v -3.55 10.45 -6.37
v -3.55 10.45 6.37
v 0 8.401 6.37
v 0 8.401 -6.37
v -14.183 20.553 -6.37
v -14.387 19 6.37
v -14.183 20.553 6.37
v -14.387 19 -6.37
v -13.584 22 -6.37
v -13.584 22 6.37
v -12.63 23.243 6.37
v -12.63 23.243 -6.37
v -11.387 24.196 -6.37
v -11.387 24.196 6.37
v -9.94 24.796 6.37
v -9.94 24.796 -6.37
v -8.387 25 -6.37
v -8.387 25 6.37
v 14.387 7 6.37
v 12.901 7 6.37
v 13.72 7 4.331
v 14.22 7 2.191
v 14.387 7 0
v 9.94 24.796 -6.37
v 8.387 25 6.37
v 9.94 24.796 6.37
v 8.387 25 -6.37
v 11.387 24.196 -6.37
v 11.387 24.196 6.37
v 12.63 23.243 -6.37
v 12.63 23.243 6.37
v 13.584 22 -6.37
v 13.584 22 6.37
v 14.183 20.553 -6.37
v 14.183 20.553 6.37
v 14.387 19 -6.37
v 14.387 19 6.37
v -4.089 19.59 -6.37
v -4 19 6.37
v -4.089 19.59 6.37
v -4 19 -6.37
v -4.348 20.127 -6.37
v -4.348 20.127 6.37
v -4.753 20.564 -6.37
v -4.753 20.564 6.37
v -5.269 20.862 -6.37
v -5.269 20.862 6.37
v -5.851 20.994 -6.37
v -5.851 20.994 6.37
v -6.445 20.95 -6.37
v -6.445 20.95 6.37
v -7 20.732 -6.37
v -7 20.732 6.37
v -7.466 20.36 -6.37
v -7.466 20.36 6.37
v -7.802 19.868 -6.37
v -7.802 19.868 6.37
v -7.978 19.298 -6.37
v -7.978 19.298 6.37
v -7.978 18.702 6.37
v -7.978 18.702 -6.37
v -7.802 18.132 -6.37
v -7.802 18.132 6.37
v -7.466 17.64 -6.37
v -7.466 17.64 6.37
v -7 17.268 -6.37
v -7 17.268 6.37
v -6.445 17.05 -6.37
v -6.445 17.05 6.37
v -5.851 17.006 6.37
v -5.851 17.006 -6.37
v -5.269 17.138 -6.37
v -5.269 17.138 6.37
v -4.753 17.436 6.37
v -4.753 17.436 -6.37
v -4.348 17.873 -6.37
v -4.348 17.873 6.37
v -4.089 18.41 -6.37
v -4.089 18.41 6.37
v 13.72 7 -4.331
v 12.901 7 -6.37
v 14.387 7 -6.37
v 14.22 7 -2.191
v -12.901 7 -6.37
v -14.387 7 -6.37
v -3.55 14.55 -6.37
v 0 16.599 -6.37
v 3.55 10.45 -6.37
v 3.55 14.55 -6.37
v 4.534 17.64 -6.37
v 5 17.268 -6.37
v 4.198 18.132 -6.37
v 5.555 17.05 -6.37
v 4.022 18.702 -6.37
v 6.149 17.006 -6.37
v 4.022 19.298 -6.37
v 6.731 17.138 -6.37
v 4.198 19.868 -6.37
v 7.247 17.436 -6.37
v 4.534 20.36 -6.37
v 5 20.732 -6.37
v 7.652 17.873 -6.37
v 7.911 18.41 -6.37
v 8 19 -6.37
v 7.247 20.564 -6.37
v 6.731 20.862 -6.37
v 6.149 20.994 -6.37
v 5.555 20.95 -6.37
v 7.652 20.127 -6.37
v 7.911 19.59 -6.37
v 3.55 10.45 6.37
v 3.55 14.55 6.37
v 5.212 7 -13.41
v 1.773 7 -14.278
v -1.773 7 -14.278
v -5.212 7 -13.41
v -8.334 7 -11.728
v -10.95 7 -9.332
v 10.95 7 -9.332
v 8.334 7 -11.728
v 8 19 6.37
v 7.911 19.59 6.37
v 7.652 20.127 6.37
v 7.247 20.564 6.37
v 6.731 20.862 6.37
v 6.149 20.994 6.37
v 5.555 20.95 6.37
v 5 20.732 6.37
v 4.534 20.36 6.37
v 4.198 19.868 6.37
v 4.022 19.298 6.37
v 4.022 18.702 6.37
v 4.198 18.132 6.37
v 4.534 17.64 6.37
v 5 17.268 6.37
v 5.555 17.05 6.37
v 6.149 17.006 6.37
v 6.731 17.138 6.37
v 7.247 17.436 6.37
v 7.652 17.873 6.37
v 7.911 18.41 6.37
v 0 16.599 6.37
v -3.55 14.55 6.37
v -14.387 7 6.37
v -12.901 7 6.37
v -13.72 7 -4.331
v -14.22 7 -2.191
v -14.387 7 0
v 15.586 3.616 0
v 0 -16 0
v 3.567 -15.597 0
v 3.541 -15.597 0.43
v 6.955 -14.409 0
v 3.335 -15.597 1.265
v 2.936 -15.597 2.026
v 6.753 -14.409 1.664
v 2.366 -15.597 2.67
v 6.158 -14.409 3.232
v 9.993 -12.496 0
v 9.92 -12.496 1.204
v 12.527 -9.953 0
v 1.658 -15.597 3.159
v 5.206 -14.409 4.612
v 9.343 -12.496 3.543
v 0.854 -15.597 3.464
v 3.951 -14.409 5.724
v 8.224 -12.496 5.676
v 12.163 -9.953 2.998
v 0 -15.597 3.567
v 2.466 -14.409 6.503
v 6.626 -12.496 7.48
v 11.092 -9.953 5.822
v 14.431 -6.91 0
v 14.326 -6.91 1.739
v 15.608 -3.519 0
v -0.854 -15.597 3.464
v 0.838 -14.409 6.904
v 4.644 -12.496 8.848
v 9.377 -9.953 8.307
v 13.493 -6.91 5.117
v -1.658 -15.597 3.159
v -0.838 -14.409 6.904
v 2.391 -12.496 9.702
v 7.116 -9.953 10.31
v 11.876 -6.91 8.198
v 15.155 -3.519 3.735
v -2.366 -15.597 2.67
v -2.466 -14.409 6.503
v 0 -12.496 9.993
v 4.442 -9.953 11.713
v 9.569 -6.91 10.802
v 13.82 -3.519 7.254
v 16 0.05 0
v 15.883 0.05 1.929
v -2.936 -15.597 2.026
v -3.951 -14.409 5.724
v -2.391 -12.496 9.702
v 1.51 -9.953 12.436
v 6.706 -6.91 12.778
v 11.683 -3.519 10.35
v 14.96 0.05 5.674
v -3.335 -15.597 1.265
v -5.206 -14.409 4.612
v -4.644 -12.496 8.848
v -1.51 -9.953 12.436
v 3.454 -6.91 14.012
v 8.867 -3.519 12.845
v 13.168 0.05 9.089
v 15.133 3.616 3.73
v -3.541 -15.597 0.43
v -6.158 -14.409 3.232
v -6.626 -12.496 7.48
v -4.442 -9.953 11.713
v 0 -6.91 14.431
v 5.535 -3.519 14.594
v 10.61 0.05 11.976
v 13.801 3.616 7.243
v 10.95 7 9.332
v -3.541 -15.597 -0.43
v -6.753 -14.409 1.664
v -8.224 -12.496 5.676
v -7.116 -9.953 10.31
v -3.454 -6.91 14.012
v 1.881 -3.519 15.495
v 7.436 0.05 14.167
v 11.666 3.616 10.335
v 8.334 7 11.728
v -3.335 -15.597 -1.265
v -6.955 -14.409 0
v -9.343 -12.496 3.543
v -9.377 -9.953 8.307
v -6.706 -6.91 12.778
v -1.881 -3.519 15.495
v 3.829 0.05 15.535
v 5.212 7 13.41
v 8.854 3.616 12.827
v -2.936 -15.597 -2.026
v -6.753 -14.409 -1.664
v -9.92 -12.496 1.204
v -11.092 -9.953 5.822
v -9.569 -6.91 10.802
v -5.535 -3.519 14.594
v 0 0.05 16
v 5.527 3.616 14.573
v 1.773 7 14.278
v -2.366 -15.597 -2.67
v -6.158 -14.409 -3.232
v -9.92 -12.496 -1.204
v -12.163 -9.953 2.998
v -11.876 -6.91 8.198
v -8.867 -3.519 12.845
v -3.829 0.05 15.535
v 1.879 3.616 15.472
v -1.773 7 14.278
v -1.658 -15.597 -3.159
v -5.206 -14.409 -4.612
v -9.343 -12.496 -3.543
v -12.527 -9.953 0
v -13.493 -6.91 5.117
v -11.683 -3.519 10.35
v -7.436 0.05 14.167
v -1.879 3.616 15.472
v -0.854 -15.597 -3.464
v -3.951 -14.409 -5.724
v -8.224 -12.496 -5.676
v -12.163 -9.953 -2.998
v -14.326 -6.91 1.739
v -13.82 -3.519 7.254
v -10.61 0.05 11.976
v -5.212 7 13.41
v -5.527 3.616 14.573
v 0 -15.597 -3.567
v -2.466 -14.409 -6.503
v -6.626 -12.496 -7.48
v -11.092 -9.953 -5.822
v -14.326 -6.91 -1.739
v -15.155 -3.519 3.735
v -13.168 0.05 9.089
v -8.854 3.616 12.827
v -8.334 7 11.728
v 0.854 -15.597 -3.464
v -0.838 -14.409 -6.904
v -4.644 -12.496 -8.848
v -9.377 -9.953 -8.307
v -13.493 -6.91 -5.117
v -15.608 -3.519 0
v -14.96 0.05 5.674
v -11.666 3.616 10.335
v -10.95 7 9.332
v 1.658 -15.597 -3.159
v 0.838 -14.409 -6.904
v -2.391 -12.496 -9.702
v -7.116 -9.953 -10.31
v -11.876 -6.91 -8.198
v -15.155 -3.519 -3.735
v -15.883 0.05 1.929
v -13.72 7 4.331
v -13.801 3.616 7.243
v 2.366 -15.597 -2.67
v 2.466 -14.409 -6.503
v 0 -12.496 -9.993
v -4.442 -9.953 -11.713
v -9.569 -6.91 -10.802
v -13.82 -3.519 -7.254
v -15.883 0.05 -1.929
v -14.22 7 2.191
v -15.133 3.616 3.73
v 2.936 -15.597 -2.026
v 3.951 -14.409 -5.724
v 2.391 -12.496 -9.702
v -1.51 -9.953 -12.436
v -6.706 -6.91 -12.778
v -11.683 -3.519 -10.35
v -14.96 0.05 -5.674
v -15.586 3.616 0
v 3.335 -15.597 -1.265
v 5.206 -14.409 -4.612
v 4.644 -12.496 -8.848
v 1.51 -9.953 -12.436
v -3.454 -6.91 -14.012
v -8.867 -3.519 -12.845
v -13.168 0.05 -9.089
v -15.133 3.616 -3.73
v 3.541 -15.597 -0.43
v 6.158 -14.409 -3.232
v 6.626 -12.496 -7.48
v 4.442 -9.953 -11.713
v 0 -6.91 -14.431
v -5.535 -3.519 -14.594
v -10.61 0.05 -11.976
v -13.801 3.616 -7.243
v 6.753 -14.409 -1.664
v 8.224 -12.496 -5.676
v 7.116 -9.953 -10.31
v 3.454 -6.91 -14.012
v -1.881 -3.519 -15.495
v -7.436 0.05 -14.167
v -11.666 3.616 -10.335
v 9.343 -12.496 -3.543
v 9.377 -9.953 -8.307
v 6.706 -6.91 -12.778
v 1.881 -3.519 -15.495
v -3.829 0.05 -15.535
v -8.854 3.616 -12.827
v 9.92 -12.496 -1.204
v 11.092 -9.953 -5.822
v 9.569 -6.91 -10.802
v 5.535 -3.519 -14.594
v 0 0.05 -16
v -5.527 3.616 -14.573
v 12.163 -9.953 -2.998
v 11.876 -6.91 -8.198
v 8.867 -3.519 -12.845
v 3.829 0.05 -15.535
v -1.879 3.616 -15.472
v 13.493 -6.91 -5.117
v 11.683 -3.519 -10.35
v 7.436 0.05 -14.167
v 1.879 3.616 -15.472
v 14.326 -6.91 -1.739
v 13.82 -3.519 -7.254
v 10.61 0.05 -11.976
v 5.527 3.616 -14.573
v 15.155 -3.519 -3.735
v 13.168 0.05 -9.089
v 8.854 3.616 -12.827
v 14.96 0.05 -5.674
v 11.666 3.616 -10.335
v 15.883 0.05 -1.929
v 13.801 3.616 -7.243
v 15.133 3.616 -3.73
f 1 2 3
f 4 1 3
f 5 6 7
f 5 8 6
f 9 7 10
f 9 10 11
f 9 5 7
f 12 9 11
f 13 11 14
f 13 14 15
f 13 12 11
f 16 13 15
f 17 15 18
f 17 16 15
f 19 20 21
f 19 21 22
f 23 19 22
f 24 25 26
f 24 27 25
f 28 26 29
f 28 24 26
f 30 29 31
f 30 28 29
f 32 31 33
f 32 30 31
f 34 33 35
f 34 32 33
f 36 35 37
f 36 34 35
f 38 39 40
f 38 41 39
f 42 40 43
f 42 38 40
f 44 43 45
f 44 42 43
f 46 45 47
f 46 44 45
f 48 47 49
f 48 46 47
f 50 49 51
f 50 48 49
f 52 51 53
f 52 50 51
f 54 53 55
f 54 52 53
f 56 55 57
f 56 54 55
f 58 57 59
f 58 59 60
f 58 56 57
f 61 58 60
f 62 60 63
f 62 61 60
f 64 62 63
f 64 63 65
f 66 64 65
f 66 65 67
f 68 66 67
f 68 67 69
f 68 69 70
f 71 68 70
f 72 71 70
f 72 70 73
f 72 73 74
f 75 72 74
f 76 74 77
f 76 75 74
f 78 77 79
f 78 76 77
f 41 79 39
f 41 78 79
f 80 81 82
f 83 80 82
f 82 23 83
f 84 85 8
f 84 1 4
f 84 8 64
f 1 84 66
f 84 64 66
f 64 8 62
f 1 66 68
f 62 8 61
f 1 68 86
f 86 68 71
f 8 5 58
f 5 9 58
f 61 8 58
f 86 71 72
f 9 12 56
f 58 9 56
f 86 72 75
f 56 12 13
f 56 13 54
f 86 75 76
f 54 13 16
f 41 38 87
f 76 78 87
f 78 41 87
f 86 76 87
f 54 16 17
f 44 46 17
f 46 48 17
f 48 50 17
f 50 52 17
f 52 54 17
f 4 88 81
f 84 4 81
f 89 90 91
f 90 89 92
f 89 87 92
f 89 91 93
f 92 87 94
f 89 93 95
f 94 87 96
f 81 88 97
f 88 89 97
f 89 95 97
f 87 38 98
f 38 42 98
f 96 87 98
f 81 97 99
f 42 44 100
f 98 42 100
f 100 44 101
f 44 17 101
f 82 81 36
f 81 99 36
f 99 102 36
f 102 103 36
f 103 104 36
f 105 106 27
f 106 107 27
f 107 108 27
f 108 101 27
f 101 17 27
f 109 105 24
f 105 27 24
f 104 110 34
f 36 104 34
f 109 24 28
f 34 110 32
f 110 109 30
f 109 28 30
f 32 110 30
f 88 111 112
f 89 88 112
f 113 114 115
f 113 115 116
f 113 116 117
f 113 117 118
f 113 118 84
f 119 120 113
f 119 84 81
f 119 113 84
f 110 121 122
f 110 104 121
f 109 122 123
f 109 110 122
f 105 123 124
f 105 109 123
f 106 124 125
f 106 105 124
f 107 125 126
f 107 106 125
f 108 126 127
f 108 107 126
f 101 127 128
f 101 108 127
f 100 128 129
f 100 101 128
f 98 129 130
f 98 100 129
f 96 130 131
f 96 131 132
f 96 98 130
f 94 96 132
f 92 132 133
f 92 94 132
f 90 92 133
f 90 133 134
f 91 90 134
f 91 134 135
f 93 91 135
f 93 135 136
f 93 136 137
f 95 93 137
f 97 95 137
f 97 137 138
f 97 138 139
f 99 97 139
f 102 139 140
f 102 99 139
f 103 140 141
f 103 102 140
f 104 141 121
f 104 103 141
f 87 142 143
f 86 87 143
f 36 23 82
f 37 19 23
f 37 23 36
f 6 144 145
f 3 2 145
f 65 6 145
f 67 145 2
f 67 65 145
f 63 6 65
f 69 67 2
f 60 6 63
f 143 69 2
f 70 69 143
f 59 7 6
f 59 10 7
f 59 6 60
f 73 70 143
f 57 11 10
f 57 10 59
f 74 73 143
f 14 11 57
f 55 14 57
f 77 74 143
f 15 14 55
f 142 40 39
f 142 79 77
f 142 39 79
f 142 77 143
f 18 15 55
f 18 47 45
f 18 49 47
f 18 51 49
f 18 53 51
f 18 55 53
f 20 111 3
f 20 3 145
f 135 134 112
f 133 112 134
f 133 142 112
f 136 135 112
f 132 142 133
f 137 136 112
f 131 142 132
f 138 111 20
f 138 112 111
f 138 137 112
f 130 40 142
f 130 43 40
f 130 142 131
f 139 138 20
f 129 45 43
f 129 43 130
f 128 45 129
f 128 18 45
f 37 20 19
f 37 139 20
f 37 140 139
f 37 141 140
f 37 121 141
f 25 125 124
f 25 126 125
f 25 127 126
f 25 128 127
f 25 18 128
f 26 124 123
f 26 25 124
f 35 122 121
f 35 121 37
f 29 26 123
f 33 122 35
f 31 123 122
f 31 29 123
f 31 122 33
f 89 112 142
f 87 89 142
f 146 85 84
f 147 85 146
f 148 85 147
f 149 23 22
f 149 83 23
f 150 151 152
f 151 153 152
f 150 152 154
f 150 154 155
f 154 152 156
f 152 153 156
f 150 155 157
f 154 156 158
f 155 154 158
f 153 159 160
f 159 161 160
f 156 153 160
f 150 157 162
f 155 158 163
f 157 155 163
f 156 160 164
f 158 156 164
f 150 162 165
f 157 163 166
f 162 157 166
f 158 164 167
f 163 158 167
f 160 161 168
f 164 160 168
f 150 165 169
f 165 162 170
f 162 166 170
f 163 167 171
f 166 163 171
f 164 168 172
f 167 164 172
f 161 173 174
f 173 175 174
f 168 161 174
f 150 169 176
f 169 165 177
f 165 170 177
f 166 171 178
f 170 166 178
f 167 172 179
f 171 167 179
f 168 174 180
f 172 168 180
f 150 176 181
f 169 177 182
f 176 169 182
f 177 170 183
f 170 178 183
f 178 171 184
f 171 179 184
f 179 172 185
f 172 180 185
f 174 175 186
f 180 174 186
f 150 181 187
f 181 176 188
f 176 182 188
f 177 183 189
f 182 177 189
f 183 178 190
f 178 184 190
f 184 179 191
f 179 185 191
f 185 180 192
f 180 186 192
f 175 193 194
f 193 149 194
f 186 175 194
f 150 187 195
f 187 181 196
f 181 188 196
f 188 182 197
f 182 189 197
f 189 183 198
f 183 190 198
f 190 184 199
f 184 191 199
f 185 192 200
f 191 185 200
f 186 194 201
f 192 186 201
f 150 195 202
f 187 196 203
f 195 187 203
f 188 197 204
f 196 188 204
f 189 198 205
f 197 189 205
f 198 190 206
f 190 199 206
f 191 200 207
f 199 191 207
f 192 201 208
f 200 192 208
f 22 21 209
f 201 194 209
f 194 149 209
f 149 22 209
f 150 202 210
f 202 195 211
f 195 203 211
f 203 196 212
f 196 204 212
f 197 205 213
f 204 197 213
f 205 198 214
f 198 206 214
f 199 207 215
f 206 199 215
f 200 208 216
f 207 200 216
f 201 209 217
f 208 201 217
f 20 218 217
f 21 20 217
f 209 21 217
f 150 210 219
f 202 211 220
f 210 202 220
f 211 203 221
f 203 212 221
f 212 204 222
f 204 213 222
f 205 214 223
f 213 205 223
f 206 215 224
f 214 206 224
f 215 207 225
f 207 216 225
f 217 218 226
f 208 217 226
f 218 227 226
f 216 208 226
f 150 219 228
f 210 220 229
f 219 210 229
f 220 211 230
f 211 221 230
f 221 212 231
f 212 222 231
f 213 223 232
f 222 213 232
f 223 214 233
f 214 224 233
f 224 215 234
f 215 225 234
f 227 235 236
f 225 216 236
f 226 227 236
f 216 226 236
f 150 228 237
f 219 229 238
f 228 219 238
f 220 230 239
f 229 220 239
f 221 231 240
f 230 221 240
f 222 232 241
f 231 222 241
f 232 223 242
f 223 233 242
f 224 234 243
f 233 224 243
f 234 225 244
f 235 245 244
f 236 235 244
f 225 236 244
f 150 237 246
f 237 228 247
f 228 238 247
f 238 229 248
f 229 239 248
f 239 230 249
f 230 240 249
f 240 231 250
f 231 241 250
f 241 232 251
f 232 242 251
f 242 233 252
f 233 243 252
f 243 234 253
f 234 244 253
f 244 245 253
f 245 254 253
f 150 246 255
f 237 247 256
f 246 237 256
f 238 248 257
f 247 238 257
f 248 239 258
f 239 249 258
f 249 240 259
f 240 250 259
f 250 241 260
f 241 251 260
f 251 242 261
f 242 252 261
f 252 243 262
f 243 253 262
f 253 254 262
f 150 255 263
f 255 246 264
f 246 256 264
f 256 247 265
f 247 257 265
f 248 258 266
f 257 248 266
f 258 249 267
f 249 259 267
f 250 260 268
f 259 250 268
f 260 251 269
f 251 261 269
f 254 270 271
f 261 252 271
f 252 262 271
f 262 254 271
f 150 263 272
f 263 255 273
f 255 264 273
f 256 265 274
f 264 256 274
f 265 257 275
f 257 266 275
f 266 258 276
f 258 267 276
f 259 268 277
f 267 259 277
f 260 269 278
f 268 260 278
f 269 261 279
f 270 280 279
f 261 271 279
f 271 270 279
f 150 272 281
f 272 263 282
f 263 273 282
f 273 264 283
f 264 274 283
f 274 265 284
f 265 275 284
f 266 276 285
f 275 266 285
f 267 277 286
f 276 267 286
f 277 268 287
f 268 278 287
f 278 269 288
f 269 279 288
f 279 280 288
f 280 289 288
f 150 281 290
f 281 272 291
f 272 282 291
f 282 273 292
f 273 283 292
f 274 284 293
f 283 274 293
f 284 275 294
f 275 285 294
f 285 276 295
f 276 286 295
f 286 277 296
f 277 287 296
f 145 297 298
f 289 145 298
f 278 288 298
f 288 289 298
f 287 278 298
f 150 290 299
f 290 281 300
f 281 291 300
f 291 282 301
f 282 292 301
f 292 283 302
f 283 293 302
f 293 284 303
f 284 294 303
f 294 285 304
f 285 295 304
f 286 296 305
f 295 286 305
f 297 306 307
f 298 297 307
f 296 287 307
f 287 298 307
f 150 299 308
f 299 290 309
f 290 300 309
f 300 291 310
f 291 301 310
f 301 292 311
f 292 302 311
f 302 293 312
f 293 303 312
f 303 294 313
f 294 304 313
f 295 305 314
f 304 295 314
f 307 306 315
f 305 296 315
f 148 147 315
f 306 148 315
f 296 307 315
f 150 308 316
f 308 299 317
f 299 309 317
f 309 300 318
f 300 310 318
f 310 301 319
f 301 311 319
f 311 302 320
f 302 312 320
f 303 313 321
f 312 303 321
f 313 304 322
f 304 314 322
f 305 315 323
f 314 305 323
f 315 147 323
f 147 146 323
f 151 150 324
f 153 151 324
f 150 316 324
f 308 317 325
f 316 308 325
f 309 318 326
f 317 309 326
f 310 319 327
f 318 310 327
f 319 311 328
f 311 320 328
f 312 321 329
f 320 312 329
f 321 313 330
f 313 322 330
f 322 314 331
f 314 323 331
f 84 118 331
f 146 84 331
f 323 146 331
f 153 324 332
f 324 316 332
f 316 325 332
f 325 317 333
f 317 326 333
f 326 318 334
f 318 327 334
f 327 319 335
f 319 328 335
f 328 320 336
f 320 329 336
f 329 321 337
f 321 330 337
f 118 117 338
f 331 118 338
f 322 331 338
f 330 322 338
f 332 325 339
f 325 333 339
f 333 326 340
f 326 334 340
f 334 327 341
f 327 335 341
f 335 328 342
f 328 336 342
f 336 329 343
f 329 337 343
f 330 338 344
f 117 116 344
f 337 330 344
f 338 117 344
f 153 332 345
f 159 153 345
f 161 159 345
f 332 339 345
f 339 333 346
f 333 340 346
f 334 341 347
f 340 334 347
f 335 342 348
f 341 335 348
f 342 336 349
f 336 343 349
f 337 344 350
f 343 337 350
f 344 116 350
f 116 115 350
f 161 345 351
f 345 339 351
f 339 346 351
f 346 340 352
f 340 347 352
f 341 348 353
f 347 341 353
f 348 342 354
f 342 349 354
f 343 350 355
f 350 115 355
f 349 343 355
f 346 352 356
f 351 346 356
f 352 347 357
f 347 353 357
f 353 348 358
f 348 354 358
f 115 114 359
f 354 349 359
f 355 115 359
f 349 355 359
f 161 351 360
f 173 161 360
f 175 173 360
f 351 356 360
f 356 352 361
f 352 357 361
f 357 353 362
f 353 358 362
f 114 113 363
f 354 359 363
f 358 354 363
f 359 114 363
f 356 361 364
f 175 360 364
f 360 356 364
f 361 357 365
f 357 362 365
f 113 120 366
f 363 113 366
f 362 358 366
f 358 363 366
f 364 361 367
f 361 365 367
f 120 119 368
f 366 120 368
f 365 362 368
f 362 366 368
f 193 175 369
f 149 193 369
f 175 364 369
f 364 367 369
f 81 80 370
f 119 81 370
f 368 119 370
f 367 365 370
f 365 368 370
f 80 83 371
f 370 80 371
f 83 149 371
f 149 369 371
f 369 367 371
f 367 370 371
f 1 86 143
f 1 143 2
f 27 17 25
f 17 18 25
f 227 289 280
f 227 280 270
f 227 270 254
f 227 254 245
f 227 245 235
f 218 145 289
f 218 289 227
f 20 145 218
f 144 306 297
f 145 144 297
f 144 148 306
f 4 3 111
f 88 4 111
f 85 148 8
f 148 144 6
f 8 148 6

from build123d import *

# Parameters (mm, degrees)
SKETCH2_W               = 28.77498914
SKETCH2_H               = 18
SKETCH2_R               = 2
BOSS_EXTRUDE1_DEPTH     = 6.37
CUT_EXTRUDE1_REACH      = 11.63
SKETCH3_W               = 27.288002312
SKETCH3_H               = 18
CUT_EXTRUDE2_START      = -14.387495
SKETCH2_2_W             = 28.77498914
SKETCH2_2_H             = 18
SKETCH2_2_R             = 2
CUT_EXTRUDE2_DEPTH      = 8.017495
FILLET1_R               = 6
CUT_EXTRUDE3_DEPTH      = 17
CUT_EXTRUDE3_DEPTH_BACK = 17


with BuildPart() as part:
    # Sketch1 → Revolve1 (revolve)
    with BuildSketch(Plane.XY):
        with BuildLine():
            Line((0, 16), (0, -16))
            ThreePointArc((0, -16), (16, 0), (0, 16))
        make_face()
    revolve(axis=Axis((0, 16, 0), (0, -1, 0)))

    # Sketch2 → Boss-Extrude1 (add, symmetric)
    with BuildSketch(Plane.XY):
        with Locations((0, 16)):
            Rectangle(SKETCH2_W, SKETCH2_H)
        with Locations((-6, 19)):
            Circle(SKETCH2_R, mode=Mode.SUBTRACT)
        with Locations((6, 19)):
            Circle(SKETCH2_R, mode=Mode.SUBTRACT)
        Polygon((0, 16.599186911), (-3.55, 14.549593456), (-3.55, 10.450406544), (0, 8.400813089), (3.55, 10.450406544), (3.55, 14.549593456), align=None, mode=Mode.SUBTRACT)
    extrude(amount=BOSS_EXTRUDE1_DEPTH, both=True)

    # Sketch3 → Cut-Extrude1 (cut, up to next)
    with BuildSketch(Plane.XY.offset(6.37), mode=Mode.PRIVATE) as cut_extrude1_sk1:
        with Locations((-0.743493414, 16)):
            Rectangle(SKETCH3_W, SKETCH3_H)
    cut_extrude1_tool1 = extrude(cut_extrude1_sk1.sketch, amount=CUT_EXTRUDE1_REACH, mode=Mode.PRIVATE) & part.part
    add(cut_extrude1_tool1.solids().sort_by_distance((-0.743493, 16, 6.37))[0], mode=Mode.SUBTRACT)

    # Sketch2<2> → Cut-Extrude2 (cut)
    with BuildSketch(Plane.XY.offset(CUT_EXTRUDE2_START)):
        Polygon((3.55, 10.450406544), (3.55, 14.549593456), (0, 16.599186911), (-3.55, 14.549593456), (-3.55, 10.450406544), (0, 8.400813089), align=None)
        with Locations((0, 16)):
            Rectangle(SKETCH2_2_W, SKETCH2_2_H)
        with Locations((6, 19)):
            Circle(SKETCH2_2_R, mode=Mode.SUBTRACT)
        with Locations((-6, 19)):
            Circle(SKETCH2_2_R, mode=Mode.SUBTRACT)
        Polygon((3.55, 14.549593456), (0, 16.599186911), (-3.55, 14.549593456), (-3.55, 10.450406544), (0, 8.400813089), (3.55, 10.450406544), align=None, mode=Mode.SUBTRACT)
    extrude(amount=CUT_EXTRUDE2_DEPTH, mode=Mode.SUBTRACT)

    # Fillet1
    fillet1_edges = [part.edges().sort_by_distance(p)[0] for p in [
        (-14.38749457, 25, 0),
        (14.38749457, 25, 0),
    ]]
    fillet(fillet1_edges, radius=FILLET1_R)

    # Sketch2<3> → Cut-Extrude3 (cut, two sides)
    with BuildSketch(Plane.XY) as cut_extrude3_sk:
        Polygon((0, 16.599186911), (-3.55, 14.549593456), (-3.55, 10.450406544), (0, 8.400813089), (3.55, 10.450406544), (3.55, 14.549593456), align=None)
    extrude(amount=CUT_EXTRUDE3_DEPTH, mode=Mode.SUBTRACT)
    extrude(cut_extrude3_sk.sketch, amount=-CUT_EXTRUDE3_DEPTH_BACK, mode=Mode.SUBTRACT)


solid = part.part
